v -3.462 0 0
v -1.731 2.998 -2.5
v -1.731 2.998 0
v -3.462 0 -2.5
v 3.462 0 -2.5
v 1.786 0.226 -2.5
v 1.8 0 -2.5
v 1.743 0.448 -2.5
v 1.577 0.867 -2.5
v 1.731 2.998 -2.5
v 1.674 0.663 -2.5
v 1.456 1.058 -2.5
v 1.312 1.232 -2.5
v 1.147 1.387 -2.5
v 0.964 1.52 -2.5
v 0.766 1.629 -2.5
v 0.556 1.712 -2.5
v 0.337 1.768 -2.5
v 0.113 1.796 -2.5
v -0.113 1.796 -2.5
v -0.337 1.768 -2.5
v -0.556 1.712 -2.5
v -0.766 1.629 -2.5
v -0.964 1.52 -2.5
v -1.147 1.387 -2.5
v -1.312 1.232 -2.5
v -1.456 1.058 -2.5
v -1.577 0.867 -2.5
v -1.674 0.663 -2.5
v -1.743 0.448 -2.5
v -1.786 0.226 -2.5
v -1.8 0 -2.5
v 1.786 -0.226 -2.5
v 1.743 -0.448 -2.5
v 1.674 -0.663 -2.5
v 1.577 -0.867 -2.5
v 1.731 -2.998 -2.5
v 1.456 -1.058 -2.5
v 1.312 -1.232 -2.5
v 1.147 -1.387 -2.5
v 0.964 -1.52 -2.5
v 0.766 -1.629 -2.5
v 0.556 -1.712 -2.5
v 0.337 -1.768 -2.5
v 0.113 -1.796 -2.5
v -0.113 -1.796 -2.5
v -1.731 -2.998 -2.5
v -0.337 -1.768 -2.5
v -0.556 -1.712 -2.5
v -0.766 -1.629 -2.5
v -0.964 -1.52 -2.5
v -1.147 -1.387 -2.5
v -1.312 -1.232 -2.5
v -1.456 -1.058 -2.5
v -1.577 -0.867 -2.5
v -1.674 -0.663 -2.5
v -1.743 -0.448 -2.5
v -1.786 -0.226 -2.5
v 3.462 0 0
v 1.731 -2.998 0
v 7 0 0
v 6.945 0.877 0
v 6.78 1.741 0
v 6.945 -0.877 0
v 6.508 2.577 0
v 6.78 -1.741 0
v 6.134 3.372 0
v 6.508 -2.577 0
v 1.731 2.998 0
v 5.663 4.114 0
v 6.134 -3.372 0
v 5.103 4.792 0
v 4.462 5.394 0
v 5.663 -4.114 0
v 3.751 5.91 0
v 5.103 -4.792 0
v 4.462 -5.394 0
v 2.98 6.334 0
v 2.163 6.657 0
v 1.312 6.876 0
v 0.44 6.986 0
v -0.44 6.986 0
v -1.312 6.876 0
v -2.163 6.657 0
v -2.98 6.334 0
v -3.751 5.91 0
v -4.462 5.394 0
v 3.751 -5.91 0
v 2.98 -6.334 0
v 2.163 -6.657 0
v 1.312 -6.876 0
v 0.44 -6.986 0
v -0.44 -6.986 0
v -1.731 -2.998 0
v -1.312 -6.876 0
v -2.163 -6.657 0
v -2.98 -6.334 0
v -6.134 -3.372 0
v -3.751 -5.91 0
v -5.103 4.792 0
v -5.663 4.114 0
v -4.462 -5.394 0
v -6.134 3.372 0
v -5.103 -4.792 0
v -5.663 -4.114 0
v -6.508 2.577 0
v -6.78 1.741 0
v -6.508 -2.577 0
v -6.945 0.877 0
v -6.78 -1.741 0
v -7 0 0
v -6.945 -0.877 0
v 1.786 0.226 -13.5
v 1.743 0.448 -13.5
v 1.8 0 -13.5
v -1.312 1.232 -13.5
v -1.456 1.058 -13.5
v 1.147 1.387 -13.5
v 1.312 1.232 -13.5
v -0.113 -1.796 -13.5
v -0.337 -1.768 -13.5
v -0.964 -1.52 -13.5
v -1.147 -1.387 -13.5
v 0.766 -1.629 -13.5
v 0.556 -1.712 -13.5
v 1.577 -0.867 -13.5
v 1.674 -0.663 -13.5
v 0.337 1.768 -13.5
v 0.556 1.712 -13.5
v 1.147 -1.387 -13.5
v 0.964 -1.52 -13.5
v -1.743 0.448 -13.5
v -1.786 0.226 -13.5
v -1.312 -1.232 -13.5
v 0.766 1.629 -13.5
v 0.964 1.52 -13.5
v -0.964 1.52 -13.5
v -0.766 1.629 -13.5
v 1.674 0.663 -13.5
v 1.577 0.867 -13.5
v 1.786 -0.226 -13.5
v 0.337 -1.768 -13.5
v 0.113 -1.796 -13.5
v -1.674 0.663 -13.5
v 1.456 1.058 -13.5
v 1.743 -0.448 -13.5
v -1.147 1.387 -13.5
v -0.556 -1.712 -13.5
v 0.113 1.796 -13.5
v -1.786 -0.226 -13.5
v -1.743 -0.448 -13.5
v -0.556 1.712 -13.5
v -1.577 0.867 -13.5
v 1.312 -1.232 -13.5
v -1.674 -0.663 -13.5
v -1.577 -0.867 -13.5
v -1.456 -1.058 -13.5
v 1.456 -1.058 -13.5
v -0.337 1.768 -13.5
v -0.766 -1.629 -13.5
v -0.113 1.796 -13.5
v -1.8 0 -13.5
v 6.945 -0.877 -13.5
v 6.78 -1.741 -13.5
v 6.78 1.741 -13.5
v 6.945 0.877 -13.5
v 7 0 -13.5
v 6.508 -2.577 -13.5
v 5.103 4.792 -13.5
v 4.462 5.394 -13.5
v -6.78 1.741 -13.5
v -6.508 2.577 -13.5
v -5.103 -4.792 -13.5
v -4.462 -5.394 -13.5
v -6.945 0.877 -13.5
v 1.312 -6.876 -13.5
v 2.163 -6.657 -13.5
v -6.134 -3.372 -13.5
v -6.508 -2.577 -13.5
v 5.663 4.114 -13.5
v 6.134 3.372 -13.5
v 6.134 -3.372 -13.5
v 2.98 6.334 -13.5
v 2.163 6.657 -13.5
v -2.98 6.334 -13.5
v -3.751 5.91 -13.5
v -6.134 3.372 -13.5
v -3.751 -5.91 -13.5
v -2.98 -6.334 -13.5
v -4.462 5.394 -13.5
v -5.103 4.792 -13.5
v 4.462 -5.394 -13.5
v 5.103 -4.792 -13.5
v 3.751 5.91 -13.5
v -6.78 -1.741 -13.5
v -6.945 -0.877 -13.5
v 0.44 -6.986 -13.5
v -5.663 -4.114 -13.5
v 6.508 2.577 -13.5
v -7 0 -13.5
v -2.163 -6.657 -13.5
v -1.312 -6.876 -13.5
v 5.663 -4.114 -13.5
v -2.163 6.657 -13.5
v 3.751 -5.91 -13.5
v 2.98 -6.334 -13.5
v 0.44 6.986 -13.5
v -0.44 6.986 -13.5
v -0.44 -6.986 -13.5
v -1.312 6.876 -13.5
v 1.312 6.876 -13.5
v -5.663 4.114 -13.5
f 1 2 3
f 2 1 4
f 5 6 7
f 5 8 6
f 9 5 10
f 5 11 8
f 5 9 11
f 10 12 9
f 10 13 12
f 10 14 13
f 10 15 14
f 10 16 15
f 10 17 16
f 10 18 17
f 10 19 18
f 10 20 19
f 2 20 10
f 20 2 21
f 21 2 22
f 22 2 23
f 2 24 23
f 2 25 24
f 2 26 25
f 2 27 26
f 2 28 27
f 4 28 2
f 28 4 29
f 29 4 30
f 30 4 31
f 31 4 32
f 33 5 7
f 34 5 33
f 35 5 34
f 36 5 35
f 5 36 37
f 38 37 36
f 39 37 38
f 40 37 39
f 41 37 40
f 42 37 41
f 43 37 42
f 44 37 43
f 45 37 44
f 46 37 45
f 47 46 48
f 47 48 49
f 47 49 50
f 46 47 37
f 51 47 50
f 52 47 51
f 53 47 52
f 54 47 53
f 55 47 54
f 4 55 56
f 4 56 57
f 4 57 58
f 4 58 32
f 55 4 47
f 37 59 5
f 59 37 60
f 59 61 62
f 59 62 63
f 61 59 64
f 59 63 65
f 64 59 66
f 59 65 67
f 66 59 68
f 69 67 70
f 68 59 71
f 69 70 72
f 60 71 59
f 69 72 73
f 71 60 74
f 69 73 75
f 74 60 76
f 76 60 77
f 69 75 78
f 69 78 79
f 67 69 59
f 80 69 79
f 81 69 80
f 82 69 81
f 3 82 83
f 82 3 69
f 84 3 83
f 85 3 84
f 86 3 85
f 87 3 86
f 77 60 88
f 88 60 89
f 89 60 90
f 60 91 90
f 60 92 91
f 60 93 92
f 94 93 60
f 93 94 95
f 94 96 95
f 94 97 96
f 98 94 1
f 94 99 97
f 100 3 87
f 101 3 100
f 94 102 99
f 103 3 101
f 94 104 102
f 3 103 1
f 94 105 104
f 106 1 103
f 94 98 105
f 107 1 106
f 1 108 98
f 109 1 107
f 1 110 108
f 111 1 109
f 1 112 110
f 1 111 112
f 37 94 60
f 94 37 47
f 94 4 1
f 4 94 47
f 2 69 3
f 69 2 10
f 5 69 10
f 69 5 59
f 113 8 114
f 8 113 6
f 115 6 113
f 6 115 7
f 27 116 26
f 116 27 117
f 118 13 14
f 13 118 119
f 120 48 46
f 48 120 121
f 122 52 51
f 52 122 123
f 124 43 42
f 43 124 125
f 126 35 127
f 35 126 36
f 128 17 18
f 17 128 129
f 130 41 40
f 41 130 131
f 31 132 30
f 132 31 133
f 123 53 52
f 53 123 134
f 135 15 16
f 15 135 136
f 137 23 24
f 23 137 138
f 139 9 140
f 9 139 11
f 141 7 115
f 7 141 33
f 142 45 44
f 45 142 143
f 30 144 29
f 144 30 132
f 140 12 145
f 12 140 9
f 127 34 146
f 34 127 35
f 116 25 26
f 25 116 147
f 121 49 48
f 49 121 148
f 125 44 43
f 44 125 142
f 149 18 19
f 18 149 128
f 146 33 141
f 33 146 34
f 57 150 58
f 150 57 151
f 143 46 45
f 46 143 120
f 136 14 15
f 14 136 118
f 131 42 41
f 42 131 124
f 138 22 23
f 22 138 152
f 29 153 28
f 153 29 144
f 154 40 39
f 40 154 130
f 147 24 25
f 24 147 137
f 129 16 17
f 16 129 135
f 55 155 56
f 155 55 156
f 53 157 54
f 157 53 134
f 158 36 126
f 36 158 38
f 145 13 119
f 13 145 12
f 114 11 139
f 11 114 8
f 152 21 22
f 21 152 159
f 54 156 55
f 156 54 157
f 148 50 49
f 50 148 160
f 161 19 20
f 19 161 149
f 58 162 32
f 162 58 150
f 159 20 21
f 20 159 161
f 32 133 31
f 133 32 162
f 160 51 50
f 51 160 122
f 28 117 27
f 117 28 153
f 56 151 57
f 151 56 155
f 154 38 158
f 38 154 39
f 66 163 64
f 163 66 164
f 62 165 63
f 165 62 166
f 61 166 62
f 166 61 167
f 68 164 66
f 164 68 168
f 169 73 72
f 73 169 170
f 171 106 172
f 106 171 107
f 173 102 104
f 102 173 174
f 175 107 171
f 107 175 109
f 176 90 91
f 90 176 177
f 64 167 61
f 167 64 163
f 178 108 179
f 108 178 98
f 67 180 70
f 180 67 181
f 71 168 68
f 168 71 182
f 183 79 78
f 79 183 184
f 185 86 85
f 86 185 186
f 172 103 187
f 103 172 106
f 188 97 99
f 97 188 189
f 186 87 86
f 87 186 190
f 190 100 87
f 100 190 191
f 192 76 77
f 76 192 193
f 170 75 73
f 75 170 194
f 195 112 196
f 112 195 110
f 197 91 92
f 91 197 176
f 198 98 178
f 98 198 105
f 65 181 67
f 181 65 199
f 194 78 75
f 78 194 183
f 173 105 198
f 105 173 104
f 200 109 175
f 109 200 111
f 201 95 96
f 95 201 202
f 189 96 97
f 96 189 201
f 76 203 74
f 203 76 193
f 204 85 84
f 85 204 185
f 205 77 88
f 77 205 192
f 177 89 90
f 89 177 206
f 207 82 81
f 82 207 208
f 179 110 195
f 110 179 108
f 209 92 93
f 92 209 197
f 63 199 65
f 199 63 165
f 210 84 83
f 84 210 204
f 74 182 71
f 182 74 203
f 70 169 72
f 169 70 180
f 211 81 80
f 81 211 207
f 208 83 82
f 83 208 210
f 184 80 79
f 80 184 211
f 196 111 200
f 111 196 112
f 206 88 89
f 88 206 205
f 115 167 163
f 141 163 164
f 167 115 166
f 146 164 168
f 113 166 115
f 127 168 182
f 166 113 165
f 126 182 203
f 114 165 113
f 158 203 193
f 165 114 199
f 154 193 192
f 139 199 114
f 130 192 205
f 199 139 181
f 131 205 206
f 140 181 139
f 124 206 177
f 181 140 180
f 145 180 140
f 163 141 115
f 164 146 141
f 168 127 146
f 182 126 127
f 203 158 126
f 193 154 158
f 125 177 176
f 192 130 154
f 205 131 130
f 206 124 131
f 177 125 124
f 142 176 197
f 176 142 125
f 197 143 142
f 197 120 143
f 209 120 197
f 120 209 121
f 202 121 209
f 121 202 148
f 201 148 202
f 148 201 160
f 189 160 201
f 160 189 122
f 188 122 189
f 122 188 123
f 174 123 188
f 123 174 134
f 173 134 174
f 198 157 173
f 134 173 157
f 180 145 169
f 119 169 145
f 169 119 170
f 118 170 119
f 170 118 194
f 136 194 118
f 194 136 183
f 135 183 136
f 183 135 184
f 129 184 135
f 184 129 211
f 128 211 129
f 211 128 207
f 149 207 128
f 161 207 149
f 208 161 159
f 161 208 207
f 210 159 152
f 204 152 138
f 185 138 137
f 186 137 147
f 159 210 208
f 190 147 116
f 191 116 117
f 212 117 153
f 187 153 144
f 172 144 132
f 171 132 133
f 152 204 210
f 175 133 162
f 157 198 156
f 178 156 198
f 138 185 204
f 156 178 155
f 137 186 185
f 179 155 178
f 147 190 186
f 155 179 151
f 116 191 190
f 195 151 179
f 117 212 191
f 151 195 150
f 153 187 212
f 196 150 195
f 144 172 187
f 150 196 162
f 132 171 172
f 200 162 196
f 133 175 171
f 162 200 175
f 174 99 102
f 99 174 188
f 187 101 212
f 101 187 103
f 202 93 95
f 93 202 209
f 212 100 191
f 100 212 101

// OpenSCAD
$fn = 50;


difference() {
	union() {
		translate(v = [0, 0, -13.5000000000]) {
			cylinder(h = 13.5000000000, r = 7.0000000000);
		}
	}
	union() {
		translate(v = [0, 0, 0]) {
			rotate(a = [0, 0, 0]) {
				difference() {
					union() {
						translate(v = [0, 0, -2.5000000000]) {
							linear_extrude(height = 2.5000000000) {
								polygon(points = [[3.4620000000, 0.0000000000], [1.7310000000, 2.9981799479], [-1.7310000000, 2.9981799479], [-3.4620000000, 0.0000000000], [-1.7310000000, -2.9981799479], [1.7310000000, -2.9981799479]]);
							}
						}
					}
					union();
				}
			}
		}
		#translate(v = [0, 0, -100.0000000000]) {
			cylinder(h = 200, r = 1.8000000000);
		}
	}
}
